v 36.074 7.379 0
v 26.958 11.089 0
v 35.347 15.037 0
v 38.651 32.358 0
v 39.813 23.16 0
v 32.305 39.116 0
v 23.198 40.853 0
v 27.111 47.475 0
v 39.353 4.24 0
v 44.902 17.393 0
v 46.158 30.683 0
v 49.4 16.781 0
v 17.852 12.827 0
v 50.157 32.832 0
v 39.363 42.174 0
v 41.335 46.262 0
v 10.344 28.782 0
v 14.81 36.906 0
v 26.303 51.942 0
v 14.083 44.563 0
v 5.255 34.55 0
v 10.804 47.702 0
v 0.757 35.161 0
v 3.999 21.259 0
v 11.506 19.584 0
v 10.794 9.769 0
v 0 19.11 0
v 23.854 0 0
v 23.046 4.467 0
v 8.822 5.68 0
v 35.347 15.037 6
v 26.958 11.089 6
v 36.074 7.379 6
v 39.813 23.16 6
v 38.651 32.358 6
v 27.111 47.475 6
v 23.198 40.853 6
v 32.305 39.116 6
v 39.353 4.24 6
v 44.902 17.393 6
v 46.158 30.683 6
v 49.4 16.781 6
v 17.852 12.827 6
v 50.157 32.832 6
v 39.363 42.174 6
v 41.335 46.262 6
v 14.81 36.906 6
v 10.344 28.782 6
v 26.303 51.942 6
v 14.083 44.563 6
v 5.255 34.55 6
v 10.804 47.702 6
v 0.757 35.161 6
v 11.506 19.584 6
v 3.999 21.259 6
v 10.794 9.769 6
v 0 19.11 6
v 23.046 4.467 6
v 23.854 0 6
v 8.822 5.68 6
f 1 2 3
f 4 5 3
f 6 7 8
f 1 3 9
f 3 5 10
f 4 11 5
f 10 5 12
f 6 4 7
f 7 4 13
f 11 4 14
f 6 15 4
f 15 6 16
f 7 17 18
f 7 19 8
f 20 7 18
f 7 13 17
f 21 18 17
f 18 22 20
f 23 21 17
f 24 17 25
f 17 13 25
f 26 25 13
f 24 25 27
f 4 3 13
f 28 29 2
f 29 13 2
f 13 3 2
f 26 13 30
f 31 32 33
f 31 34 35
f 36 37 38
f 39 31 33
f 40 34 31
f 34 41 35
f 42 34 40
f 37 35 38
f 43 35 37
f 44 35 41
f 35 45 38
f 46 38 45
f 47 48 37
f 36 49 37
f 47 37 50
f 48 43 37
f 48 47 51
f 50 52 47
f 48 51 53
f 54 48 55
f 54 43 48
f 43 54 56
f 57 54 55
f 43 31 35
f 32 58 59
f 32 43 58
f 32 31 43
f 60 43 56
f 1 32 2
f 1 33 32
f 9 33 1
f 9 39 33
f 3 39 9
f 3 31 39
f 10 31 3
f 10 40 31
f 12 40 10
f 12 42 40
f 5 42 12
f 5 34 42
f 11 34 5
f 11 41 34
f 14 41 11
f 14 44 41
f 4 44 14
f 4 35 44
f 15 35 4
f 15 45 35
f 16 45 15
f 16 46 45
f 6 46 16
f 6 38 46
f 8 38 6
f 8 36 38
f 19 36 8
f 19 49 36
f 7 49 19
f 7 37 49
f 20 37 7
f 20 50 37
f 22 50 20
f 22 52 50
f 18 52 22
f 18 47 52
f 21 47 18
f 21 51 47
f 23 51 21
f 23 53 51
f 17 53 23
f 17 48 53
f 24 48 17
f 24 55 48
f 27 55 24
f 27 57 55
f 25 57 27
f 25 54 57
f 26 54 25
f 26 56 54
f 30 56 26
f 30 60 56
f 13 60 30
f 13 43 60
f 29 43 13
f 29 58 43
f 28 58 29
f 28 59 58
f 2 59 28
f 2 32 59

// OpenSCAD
$fn = 32;

// ----------------------------------------------------------------------
// Fan rotor section: 10 blades, 15 mm hub radius, 11 mm blades
// ----------------------------------------------------------------------

// --- parameters (mm) ---
profile_height = 6;       // extrusion height
profile_points = 30;      // points of the closed outline

profile = [[39.813, 23.16], [46.158, 30.683], [50.157, 32.832], [38.651, 32.358], [39.363, 42.174], [41.335, 46.262], [32.305, 39.116], [27.111, 47.475], [26.303, 51.942], [23.198, 40.853], [14.083, 44.563], [10.804, 47.702], [14.81, 36.906], [5.255, 34.55], [0.757, 35.161], [10.344, 28.782], [3.999, 21.259], [0, 19.11], [11.506, 19.584], [10.794, 9.769], [8.822, 5.68], [17.852, 12.827], [23.046, 4.467], [23.854, 0], [26.958, 11.089], [36.074, 7.379], [39.353, 4.24], [35.347, 15.037], [44.902, 17.393], [49.4, 16.781]];  // single closed polygon, 30 points, counter clockwise

// --- the one profile operation ---
linear_extrude(height = profile_height) polygon(points = profile);
